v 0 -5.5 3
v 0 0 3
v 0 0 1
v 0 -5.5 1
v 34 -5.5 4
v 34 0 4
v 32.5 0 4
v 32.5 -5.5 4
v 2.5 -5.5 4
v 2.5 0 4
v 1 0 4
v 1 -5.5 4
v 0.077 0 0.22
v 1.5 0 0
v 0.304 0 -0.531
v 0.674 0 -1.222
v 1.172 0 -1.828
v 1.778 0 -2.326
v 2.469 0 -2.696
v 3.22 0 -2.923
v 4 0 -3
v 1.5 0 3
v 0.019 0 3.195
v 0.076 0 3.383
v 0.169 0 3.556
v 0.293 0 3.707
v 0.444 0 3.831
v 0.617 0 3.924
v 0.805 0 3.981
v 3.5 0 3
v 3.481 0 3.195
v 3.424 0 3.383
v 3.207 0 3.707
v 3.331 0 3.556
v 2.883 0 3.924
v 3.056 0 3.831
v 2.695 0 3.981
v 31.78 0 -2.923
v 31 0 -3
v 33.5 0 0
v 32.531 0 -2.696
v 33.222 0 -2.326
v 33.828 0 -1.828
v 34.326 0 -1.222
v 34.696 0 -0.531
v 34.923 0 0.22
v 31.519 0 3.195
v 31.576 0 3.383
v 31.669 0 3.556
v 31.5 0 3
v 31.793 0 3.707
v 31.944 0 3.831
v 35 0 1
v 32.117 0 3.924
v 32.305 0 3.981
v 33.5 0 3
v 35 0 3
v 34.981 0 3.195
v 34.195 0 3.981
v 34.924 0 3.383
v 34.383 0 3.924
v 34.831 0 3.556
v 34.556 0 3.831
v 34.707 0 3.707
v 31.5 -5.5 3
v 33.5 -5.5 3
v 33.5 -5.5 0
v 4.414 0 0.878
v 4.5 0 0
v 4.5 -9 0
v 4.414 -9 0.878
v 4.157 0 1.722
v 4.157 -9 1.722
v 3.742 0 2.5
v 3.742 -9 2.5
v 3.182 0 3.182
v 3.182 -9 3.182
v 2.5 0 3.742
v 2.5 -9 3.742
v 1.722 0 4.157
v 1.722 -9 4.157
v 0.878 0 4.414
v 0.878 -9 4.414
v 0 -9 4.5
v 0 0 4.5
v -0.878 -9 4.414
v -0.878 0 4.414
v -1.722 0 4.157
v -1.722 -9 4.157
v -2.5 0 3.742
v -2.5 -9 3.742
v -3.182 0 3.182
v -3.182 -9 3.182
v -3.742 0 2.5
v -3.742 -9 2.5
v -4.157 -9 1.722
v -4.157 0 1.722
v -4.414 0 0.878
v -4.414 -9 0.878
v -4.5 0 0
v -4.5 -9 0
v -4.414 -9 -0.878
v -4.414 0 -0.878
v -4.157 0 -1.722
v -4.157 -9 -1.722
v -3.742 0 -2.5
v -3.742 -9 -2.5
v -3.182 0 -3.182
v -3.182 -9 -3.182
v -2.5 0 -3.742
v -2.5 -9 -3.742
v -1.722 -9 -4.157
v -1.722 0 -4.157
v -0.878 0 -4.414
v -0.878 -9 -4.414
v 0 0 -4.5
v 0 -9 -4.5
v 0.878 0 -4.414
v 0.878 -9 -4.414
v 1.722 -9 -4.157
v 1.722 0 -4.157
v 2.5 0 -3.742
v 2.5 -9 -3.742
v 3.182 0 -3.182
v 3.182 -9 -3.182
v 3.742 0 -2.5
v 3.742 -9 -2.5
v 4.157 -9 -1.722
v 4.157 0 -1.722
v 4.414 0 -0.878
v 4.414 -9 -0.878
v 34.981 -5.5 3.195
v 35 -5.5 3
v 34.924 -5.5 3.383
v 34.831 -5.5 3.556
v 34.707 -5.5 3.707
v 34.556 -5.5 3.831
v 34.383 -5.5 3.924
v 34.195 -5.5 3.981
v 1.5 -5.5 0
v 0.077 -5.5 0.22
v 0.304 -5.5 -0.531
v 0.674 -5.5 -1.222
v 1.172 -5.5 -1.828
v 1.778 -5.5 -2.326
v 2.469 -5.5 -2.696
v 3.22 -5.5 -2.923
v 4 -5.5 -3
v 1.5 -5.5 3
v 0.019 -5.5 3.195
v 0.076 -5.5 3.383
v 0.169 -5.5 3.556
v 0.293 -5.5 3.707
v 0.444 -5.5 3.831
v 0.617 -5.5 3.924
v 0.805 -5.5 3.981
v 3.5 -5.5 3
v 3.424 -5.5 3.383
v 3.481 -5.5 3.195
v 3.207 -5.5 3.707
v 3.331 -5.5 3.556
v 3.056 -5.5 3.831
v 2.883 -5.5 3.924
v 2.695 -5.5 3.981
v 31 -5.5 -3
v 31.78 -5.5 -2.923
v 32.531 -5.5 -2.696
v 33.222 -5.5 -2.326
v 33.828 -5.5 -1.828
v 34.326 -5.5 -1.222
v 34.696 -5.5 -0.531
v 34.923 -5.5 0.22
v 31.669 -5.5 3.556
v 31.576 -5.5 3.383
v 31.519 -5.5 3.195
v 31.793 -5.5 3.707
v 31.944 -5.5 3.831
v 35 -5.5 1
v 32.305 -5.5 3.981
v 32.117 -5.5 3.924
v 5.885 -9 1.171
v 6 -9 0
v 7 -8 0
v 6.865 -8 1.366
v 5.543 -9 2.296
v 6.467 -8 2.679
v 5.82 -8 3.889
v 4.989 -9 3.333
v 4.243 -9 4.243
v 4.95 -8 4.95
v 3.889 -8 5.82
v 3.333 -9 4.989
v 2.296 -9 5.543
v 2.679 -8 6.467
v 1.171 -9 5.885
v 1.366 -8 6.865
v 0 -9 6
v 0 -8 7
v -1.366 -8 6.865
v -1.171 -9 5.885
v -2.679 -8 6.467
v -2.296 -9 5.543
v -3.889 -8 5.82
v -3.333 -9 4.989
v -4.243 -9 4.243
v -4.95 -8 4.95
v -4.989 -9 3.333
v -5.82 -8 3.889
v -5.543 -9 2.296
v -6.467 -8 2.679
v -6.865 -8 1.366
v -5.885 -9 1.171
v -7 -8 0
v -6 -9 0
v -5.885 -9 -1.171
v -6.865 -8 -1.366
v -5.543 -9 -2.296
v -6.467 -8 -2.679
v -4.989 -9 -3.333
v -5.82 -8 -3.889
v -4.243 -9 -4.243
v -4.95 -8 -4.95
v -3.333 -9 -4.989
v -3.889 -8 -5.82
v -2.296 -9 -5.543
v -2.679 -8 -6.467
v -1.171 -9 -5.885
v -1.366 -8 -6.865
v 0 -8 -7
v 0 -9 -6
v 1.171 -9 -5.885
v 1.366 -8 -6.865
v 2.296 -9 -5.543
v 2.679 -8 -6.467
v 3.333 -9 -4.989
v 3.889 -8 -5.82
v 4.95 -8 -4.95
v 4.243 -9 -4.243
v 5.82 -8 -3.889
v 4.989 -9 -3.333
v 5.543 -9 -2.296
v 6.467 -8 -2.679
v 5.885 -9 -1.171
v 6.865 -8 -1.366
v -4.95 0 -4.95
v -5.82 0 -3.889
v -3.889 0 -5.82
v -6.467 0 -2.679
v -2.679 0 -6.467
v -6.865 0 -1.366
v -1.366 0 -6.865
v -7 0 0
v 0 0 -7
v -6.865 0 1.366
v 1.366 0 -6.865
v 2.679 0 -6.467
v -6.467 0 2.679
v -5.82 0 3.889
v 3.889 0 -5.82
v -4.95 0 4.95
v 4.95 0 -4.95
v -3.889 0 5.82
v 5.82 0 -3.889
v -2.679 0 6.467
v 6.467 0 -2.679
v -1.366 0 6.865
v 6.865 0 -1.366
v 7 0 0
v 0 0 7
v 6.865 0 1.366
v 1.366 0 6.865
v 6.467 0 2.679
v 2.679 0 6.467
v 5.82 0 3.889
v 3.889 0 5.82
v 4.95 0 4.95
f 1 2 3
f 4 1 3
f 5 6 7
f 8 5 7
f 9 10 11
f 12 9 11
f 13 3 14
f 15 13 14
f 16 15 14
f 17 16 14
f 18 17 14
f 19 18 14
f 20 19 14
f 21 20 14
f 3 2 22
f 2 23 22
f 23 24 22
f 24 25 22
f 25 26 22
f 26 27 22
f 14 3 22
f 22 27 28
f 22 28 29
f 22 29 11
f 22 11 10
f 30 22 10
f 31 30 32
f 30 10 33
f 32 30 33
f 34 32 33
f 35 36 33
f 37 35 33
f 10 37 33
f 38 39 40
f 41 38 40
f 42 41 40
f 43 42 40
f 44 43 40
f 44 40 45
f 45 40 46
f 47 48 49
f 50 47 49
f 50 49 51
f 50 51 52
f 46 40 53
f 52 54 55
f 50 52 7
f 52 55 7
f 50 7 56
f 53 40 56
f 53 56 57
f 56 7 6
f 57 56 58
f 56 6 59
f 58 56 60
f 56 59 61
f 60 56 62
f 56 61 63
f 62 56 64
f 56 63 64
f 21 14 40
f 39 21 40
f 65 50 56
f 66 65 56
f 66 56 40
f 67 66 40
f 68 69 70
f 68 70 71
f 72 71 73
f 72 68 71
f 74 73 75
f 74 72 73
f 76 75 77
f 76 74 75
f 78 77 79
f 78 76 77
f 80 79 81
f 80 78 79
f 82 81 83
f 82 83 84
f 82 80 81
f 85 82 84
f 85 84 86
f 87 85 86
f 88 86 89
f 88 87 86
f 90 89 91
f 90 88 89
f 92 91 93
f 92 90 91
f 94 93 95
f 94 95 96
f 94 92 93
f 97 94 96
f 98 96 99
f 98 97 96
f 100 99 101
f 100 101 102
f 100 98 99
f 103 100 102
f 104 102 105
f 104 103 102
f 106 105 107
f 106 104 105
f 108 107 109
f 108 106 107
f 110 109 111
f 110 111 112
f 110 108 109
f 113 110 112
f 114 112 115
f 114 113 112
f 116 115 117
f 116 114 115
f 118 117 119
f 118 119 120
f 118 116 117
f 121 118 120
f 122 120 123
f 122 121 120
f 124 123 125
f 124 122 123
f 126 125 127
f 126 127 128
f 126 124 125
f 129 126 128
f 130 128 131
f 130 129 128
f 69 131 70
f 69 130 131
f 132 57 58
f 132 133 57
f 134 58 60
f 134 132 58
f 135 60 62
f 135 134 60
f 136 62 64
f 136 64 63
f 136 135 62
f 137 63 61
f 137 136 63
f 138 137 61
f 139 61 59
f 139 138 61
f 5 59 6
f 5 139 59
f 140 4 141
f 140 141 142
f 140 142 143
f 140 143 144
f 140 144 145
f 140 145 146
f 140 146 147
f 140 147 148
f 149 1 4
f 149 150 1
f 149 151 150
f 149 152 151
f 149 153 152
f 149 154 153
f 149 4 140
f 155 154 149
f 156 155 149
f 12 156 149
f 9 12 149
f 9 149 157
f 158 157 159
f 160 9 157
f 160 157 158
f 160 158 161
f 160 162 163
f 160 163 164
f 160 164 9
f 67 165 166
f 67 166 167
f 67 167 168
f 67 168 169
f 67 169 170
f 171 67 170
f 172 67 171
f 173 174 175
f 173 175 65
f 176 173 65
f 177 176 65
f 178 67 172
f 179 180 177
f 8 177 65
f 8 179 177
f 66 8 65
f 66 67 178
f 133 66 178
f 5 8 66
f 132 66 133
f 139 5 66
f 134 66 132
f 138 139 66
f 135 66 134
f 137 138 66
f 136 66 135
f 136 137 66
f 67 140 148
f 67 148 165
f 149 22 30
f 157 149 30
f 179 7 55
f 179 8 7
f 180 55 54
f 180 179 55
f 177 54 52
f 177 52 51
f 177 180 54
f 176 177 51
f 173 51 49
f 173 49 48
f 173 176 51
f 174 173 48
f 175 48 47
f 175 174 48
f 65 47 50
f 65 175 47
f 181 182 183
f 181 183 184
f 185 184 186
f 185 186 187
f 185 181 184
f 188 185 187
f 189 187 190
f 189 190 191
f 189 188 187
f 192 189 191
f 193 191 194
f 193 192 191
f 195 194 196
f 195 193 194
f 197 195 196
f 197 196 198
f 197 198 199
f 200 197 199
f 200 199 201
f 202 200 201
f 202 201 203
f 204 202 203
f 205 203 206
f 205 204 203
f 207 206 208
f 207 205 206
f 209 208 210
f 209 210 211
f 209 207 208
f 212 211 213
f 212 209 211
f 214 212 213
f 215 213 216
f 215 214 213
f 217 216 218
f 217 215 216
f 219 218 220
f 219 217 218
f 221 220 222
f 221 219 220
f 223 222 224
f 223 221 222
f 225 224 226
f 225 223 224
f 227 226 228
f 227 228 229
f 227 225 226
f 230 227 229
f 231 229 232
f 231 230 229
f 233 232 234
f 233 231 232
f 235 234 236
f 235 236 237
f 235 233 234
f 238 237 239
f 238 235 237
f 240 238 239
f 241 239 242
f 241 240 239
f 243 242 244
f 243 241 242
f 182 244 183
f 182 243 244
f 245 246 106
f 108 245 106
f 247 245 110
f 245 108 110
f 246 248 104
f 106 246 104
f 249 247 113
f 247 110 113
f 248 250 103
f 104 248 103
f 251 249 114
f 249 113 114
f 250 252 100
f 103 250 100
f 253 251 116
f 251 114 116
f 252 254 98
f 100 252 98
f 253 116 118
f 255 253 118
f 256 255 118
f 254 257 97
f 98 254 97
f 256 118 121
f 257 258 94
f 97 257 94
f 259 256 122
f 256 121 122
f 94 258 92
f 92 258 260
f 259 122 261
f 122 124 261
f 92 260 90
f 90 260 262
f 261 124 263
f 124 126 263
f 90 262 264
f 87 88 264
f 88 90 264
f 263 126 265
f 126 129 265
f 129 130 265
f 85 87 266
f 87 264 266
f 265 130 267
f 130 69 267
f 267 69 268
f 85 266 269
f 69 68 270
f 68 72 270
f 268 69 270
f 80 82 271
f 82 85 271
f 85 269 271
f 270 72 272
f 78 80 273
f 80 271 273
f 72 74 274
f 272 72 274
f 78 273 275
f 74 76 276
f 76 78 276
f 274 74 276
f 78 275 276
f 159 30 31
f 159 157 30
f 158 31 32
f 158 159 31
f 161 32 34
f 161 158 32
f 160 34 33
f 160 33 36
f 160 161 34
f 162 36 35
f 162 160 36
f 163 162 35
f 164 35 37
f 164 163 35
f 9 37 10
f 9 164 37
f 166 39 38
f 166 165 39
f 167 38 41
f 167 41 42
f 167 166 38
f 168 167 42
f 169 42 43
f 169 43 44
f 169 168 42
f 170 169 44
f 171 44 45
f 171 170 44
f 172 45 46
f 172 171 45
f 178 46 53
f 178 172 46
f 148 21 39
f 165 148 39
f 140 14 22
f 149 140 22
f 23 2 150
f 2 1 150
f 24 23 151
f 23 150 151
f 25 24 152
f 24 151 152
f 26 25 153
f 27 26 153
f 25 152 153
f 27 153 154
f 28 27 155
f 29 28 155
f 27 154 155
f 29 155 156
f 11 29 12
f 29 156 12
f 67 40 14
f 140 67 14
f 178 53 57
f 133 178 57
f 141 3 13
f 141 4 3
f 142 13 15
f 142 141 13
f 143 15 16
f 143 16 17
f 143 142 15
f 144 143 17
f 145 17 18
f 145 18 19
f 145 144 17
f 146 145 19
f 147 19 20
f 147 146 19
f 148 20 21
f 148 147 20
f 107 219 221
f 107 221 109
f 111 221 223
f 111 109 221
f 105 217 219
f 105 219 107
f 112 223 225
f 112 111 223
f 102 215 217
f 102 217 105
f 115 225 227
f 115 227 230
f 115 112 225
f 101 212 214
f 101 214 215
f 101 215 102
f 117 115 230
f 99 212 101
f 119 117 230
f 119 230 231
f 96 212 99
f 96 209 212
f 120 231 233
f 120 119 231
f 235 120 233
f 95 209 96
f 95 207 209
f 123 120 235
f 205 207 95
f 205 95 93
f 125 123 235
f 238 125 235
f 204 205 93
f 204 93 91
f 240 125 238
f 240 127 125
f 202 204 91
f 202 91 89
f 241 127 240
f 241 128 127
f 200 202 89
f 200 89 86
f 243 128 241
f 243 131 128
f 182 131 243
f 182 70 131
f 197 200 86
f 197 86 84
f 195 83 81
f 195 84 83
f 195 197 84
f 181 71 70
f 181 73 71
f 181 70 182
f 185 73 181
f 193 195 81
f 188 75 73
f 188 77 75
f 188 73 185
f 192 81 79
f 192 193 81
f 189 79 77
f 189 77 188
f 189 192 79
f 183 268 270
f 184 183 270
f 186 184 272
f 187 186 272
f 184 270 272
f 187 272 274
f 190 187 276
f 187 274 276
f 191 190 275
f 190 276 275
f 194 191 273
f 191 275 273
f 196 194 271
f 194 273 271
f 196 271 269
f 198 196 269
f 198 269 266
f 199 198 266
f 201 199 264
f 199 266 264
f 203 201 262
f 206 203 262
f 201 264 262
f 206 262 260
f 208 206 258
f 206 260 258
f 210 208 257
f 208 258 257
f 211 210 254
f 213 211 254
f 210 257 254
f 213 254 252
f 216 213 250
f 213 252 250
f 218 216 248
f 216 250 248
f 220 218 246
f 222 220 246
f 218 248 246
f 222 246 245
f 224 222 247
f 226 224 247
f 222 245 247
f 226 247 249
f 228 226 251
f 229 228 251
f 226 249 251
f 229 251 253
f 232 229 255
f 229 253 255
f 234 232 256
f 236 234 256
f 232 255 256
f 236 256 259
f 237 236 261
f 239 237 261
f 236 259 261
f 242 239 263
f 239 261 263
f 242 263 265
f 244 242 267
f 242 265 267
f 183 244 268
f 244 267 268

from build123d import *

# Parameters (mm, degrees)
F1_DEPTH = 5.5
F2_R     = 0.99999
F3_R     = 4
F4_R     = 7
F4_R_2   = 4.5
F5_DEPTH = 9
F6_SIZE  = 1


# Not quite as in the source:
# - a fillet or chamfer is up to 0.001 mm smaller than in the source, because OpenCascade refuses the exact size


with BuildPart() as f1:
    # F0 (on Front) → F1 (new body)
    with BuildSketch(Plane.XZ):
        Polygon((0, 4), (0, 0), (1.5, 0), (1.5, 3), (3.5, 3), (3.5, 4), align=None)
        Polygon((1.5, 0), (0, 0), (0, -3), (35, -3), (35, 0), (33.5, 0), (17.5, 0), align=None)
        Polygon((33.5, 3), (33.5, 0), (35, 0), (35, 4), (31.5, 4), (31.5, 3), align=None)
    extrude(amount=F1_DEPTH)

    # F2 (radius 1 in the source; OpenCascade refuses exactly that, so slightly less here)
    f2_edges = [f1.edges().sort_by_distance(p)[0] for p in [
        (31.5, -2.75, 4),
        (3.5, -2.75, 4),
        (35, -2.75, 4),
        (0, -2.75, 4),
    ]]
    fillet(f2_edges, radius=F2_R)

    # F3
    f3_edges = [f1.edges().sort_by_distance(p)[0] for p in [
        (0, -2.75, -3),
        (35, -2.75, -3),
    ]]
    fillet(f3_edges, radius=F3_R)


with BuildPart() as f5:
    # F4 (on Front) → F5 (new body)
    with BuildSketch(Plane.XZ):
        Circle(F4_R)
        Circle(F4_R_2, mode=Mode.SUBTRACT)
    extrude(amount=F5_DEPTH)

    # F6
    f6_edges = [f5.edges().sort_by_distance(p)[0] for p in [
        (-7, -9, 0),
    ]]
    chamfer(f6_edges, length=F6_SIZE)


solid = Compound([f1.part, f5.part])
